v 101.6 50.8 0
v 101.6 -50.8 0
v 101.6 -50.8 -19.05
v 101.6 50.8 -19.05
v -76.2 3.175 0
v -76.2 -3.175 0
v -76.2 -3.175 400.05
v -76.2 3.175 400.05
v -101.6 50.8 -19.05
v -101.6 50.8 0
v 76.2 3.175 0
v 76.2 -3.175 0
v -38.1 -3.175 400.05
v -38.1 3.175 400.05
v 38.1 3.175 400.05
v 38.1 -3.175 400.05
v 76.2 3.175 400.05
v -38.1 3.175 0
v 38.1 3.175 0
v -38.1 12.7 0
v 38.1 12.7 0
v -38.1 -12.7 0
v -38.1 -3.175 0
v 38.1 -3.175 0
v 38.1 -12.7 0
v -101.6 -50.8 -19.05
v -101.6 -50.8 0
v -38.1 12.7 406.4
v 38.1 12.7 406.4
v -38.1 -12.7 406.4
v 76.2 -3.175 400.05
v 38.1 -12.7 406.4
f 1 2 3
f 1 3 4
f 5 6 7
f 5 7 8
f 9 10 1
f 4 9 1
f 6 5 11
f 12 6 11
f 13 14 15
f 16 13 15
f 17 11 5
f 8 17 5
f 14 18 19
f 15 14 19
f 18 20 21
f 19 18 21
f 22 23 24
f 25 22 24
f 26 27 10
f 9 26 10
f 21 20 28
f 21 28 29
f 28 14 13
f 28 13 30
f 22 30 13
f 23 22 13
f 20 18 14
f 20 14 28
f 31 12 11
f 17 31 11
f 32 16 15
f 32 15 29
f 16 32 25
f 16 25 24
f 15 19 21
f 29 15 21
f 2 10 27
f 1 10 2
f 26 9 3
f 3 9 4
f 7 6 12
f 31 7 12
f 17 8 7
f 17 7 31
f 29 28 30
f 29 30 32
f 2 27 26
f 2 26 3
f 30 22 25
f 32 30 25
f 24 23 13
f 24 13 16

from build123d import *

# Parameters (mm, degrees)
F0_W     = 203.2
F0_H     = 101.6
F0_W_2   = 76.2
F0_H_2   = 9.525
F0_W_3   = 38.1
F0_H_3   = 6.35
F1_DEPTH = 19.05
F2_DEPTH = 406.4
F3_DEPTH = 400.05
F4_W     = 76.2
F4_H     = 9.525
F4_H_2   = 6.35
F5_DEPTH = 6.35


with BuildPart() as f1:
    # F0 (on Top) → F1 (new body)
    with BuildSketch(Plane.XY):
        Rectangle(F0_W, F0_H)
        Polygon((-38.1, 12.7), (38.1, 12.7), (38.1, 3.175), (76.2, 3.175), (76.2, -3.175), (38.1, -3.175), (38.1, -12.7), (-38.1, -12.7), (-38.1, -3.175), (-76.2, -3.175), (-76.2, 3.175), (-38.1, 3.175), align=None, mode=Mode.SUBTRACT)
        with Locations((0, 7.9375)):
            Rectangle(F0_W_2, F0_H_2)
        with Locations((57.15, 0)):
            Rectangle(F0_W_3, F0_H_3)
        Rectangle(F0_W_2, F0_H_3)
        with Locations((0, -7.9375)):
            Rectangle(F0_W_2, F0_H_2)
        with Locations((-57.15, 0)):
            Rectangle(F0_W_3, F0_H_3)
    extrude(amount=-F1_DEPTH)


with BuildPart() as f2:
    # F0 (on Top) → F2 (new body)
    with BuildSketch(Plane.XY):
        with Locations((0, 7.9375)):
            Rectangle(F0_W_2, F0_H_2)
    extrude(amount=F2_DEPTH)



with BuildPart() as f2b:
    # F0 (on Top) → F2, piece 2 (new body)
    with BuildSketch(Plane.XY):
        with Locations((0, -7.9375)):
            Rectangle(F0_W_2, F0_H_2)
    extrude(amount=F2_DEPTH)


with BuildPart() as f3:
    # F0 (on Top) → F3 (new body)
    with BuildSketch(Plane.XY):
        with Locations((57.15, 0)):
            Rectangle(F0_W_3, F0_H_3)
        Rectangle(F0_W_2, F0_H_3)
        with Locations((-57.15, 0)):
            Rectangle(F0_W_3, F0_H_3)
    extrude(amount=F3_DEPTH)


with BuildPart() as f2_1:
    add(f2.part)

    add(f2b.part)  # F5 merges F2b
    # F4 (on face) → F5 (join)
    with BuildSketch(Plane.XY.offset(406.4)):
        with Locations((0, 7.9375)):
            Rectangle(F4_W, F4_H)
        Rectangle(F4_W, F4_H_2)
    extrude(amount=-F5_DEPTH)


solid = Compound([f1.part, f3.part, f2_1.part])
